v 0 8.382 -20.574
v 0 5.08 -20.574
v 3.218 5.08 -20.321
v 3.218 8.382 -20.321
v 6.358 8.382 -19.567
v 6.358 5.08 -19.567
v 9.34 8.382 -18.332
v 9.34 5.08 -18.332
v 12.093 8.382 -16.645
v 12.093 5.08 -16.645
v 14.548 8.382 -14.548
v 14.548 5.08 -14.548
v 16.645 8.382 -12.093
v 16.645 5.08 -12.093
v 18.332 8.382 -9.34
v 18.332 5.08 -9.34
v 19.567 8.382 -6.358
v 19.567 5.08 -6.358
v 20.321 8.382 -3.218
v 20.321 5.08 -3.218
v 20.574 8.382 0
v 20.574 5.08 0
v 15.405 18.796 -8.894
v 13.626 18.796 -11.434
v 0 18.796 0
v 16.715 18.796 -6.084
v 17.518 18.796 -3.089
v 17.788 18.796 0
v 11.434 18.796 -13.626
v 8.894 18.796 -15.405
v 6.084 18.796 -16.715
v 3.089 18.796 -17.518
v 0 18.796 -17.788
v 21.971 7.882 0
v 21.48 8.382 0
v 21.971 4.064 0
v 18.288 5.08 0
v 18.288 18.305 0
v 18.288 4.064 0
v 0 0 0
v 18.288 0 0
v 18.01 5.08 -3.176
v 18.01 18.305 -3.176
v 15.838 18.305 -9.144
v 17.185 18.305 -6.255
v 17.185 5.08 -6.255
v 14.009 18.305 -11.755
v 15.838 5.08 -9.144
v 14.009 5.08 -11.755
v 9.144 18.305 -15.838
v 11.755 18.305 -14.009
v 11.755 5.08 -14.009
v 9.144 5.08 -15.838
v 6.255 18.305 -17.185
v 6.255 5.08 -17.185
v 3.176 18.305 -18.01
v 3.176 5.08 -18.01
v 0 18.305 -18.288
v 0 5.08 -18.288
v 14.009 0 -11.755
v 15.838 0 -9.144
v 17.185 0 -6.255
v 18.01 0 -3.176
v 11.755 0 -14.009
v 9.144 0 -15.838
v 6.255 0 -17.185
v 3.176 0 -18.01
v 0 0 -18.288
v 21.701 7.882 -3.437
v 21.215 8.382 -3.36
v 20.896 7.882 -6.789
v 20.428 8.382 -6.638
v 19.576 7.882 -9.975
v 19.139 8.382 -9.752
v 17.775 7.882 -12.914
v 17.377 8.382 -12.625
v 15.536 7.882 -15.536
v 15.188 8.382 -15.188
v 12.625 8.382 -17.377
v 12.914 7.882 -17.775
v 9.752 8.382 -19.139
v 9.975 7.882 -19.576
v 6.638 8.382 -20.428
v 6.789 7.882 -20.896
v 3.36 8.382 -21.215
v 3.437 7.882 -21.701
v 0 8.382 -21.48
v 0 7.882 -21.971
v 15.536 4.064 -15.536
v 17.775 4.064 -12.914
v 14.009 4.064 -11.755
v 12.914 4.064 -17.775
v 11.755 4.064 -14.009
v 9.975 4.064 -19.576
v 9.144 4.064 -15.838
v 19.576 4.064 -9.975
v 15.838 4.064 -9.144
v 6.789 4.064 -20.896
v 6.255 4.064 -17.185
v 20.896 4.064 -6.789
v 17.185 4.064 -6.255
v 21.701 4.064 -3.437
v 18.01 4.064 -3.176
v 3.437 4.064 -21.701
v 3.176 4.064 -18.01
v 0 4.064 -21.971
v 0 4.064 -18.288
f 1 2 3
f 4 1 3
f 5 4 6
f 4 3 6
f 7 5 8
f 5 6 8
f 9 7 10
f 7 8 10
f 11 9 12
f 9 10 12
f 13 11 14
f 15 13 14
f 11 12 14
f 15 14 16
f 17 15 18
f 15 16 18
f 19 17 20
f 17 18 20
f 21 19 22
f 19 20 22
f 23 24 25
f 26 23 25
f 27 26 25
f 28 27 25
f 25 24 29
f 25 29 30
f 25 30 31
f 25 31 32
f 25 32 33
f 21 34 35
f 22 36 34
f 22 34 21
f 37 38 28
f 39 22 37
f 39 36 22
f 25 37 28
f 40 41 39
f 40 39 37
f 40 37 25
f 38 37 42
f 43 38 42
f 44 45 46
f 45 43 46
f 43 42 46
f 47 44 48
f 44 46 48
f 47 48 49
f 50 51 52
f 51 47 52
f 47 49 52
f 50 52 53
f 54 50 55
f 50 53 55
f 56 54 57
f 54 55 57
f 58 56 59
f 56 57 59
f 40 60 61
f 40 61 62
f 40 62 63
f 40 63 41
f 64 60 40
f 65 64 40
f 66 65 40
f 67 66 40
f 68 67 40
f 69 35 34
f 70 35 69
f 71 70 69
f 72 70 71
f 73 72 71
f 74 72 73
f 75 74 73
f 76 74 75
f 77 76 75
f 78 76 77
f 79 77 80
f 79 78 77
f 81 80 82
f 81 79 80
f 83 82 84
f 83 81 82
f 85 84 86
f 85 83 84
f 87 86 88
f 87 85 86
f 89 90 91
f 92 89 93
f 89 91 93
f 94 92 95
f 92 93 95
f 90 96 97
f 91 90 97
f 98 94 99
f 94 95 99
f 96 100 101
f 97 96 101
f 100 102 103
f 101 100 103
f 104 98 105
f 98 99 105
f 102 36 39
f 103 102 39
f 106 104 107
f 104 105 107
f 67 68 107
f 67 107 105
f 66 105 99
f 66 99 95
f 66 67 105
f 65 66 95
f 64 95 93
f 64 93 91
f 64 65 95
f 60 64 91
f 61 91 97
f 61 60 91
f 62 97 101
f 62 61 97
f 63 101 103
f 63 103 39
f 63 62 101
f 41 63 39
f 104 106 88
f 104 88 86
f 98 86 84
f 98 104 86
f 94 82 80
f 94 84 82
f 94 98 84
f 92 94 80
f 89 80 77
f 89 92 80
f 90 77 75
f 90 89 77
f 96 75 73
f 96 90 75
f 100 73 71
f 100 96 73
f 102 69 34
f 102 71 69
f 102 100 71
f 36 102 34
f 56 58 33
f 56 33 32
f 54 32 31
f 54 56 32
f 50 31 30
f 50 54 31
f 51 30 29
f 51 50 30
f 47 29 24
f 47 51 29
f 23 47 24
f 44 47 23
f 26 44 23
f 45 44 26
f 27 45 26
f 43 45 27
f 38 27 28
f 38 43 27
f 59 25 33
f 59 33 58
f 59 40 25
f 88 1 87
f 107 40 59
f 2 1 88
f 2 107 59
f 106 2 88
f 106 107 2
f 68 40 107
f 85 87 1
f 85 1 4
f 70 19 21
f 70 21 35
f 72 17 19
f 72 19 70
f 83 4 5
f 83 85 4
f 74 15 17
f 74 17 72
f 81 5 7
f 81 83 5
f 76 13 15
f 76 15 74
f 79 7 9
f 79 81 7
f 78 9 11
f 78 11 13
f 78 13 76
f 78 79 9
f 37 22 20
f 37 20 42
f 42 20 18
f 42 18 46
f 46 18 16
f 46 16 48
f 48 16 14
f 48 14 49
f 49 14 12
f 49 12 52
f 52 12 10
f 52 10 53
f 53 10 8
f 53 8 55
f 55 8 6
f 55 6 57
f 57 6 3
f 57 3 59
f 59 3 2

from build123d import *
from OCP.BRepFilletAPI import BRepFilletAPI_MakeChamfer

# Parameters (mm, degrees)
BOSS_EXTRUDE3_DEPTH     = 18.796
CUT_EXTRUDE1_START      = -10.414
CUT_EXTRUDE1_DEPTH      = 10.414
CUT_EXTRUDE_THIN1_DEPTH = 4.064
CUT_EXTRUDE2_START      = -3.302
CUT_EXTRUDE2_DEPTH      = 3.302
CHAMFER1_SIZE           = 0.5
CHAMFER1_SIZE2          = 0.491348578


with BuildPart() as part:
    # Sketch2 → Boss-Extrude3 (new body)
    with BuildSketch(Plane(origin=(0, 0, 0), x_dir=(1, 0, 0), z_dir=(0, 1, 0))):
        with BuildLine():
            Line((0, 0), (0, 21.971))
            ThreePointArc((0, 21.971), (15.535843089, 15.535843089), (21.971, 0))
            Line((21.971, 0), (0, 0))
        make_face()
    extrude(amount=BOSS_EXTRUDE3_DEPTH)

    # Sketch4 → Cut-Extrude1 (cut)
    with BuildSketch(Plane(origin=(0, 18.796, 0), x_dir=(1, 0, 0), z_dir=(0, 1, 0)).offset(CUT_EXTRUDE1_START)):
        with BuildLine():
            Line((18.288, 0), (21.971, 0))
            ThreePointArc((21.971, 0), (15.535843089, 15.535843089), (0, 21.971))
            Line((0, 21.971), (0, 18.288))
            ThreePointArc((0, 18.288), (12.931568814, 12.931568814), (18.288, 0))
        make_face()
    extrude(amount=CUT_EXTRUDE1_DEPTH, mode=Mode.SUBTRACT)

    # Sketch5 → Cut-Extrude-Thin1 (cut)
    with BuildSketch(Plane.XZ):
        with BuildLine():
            ThreePointArc((21.971, 0), (15.535843089, -15.535843089), (0, -21.971))
            Line((0, -21.971), (0, -19.431))
            ThreePointArc((0, -19.431), (13.739791865, -13.739791865), (19.431, 0))
            Line((19.431, 0), (21.971, 0))
        make_face()
        with BuildLine():
            ThreePointArc((0, -18.288), (12.931568814, -12.931568814), (18.288, 0))
            Line((18.288, 0), (20.828, 0))
            ThreePointArc((20.828, 0), (14.727620039, -14.727620039), (0, -20.828))
            Line((0, -20.828), (0, -18.288))
        make_face()
    extrude(amount=-CUT_EXTRUDE_THIN1_DEPTH, mode=Mode.SUBTRACT)

    # Sketch6 → Cut-Extrude2 (cut)
    with BuildSketch(Plane(origin=(0, 8.382, 0), x_dir=(1, 0, 0), z_dir=(0, 1, 0)).offset(CUT_EXTRUDE2_START)):
        with BuildLine():
            Line((0, 18.288), (0, 20.574))
            ThreePointArc((0, 20.574), (14.548014916, 14.548014916), (20.574, 0))
            Line((20.574, 0), (18.288, 0))
            ThreePointArc((18.288, 0), (12.931568814, 12.931568814), (0, 18.288))
        make_face()
    extrude(amount=CUT_EXTRUDE2_DEPTH, mode=Mode.SUBTRACT)

    # Chamfer1: one chamfer whose edges measure the first distance from different faces: ONE call of the kernel's chamfer builder (chamfer() names one face for all edges)
    chamfer1_edges_1 = [part.edges().sort_by_distance(p)[0] for p in [
        (15.535843089, 8.382, -15.535843089),
    ]]
    chamfer1_side_1 = [part.faces().sort_by_distance(p)[0] for p in [
        (15.535843089, 6.223, -15.535843089),
    ]]
    chamfer1_edges_2 = [part.edges().sort_by_distance(p)[0] for p in [
        (12.931568814, 18.796, -12.931568814),
    ]]
    chamfer1_side_2 = [part.faces().sort_by_distance(p)[0] for p in [
        (7.761668265, 18.796, -7.761668265),
    ]]
    chamfer1 = BRepFilletAPI_MakeChamfer(part.part.solid().wrapped)
    for e in chamfer1_edges_1:
        chamfer1.Add(CHAMFER1_SIZE, CHAMFER1_SIZE2, e.wrapped, chamfer1_side_1[0].wrapped)  # the first distance lies on this face
    for e in chamfer1_edges_2:
        chamfer1.Add(CHAMFER1_SIZE, CHAMFER1_SIZE2, e.wrapped, chamfer1_side_2[0].wrapped)  # the first distance lies on this face
    add(Compound.cast(chamfer1.Shape()), mode=Mode.REPLACE)


solid = part.part
